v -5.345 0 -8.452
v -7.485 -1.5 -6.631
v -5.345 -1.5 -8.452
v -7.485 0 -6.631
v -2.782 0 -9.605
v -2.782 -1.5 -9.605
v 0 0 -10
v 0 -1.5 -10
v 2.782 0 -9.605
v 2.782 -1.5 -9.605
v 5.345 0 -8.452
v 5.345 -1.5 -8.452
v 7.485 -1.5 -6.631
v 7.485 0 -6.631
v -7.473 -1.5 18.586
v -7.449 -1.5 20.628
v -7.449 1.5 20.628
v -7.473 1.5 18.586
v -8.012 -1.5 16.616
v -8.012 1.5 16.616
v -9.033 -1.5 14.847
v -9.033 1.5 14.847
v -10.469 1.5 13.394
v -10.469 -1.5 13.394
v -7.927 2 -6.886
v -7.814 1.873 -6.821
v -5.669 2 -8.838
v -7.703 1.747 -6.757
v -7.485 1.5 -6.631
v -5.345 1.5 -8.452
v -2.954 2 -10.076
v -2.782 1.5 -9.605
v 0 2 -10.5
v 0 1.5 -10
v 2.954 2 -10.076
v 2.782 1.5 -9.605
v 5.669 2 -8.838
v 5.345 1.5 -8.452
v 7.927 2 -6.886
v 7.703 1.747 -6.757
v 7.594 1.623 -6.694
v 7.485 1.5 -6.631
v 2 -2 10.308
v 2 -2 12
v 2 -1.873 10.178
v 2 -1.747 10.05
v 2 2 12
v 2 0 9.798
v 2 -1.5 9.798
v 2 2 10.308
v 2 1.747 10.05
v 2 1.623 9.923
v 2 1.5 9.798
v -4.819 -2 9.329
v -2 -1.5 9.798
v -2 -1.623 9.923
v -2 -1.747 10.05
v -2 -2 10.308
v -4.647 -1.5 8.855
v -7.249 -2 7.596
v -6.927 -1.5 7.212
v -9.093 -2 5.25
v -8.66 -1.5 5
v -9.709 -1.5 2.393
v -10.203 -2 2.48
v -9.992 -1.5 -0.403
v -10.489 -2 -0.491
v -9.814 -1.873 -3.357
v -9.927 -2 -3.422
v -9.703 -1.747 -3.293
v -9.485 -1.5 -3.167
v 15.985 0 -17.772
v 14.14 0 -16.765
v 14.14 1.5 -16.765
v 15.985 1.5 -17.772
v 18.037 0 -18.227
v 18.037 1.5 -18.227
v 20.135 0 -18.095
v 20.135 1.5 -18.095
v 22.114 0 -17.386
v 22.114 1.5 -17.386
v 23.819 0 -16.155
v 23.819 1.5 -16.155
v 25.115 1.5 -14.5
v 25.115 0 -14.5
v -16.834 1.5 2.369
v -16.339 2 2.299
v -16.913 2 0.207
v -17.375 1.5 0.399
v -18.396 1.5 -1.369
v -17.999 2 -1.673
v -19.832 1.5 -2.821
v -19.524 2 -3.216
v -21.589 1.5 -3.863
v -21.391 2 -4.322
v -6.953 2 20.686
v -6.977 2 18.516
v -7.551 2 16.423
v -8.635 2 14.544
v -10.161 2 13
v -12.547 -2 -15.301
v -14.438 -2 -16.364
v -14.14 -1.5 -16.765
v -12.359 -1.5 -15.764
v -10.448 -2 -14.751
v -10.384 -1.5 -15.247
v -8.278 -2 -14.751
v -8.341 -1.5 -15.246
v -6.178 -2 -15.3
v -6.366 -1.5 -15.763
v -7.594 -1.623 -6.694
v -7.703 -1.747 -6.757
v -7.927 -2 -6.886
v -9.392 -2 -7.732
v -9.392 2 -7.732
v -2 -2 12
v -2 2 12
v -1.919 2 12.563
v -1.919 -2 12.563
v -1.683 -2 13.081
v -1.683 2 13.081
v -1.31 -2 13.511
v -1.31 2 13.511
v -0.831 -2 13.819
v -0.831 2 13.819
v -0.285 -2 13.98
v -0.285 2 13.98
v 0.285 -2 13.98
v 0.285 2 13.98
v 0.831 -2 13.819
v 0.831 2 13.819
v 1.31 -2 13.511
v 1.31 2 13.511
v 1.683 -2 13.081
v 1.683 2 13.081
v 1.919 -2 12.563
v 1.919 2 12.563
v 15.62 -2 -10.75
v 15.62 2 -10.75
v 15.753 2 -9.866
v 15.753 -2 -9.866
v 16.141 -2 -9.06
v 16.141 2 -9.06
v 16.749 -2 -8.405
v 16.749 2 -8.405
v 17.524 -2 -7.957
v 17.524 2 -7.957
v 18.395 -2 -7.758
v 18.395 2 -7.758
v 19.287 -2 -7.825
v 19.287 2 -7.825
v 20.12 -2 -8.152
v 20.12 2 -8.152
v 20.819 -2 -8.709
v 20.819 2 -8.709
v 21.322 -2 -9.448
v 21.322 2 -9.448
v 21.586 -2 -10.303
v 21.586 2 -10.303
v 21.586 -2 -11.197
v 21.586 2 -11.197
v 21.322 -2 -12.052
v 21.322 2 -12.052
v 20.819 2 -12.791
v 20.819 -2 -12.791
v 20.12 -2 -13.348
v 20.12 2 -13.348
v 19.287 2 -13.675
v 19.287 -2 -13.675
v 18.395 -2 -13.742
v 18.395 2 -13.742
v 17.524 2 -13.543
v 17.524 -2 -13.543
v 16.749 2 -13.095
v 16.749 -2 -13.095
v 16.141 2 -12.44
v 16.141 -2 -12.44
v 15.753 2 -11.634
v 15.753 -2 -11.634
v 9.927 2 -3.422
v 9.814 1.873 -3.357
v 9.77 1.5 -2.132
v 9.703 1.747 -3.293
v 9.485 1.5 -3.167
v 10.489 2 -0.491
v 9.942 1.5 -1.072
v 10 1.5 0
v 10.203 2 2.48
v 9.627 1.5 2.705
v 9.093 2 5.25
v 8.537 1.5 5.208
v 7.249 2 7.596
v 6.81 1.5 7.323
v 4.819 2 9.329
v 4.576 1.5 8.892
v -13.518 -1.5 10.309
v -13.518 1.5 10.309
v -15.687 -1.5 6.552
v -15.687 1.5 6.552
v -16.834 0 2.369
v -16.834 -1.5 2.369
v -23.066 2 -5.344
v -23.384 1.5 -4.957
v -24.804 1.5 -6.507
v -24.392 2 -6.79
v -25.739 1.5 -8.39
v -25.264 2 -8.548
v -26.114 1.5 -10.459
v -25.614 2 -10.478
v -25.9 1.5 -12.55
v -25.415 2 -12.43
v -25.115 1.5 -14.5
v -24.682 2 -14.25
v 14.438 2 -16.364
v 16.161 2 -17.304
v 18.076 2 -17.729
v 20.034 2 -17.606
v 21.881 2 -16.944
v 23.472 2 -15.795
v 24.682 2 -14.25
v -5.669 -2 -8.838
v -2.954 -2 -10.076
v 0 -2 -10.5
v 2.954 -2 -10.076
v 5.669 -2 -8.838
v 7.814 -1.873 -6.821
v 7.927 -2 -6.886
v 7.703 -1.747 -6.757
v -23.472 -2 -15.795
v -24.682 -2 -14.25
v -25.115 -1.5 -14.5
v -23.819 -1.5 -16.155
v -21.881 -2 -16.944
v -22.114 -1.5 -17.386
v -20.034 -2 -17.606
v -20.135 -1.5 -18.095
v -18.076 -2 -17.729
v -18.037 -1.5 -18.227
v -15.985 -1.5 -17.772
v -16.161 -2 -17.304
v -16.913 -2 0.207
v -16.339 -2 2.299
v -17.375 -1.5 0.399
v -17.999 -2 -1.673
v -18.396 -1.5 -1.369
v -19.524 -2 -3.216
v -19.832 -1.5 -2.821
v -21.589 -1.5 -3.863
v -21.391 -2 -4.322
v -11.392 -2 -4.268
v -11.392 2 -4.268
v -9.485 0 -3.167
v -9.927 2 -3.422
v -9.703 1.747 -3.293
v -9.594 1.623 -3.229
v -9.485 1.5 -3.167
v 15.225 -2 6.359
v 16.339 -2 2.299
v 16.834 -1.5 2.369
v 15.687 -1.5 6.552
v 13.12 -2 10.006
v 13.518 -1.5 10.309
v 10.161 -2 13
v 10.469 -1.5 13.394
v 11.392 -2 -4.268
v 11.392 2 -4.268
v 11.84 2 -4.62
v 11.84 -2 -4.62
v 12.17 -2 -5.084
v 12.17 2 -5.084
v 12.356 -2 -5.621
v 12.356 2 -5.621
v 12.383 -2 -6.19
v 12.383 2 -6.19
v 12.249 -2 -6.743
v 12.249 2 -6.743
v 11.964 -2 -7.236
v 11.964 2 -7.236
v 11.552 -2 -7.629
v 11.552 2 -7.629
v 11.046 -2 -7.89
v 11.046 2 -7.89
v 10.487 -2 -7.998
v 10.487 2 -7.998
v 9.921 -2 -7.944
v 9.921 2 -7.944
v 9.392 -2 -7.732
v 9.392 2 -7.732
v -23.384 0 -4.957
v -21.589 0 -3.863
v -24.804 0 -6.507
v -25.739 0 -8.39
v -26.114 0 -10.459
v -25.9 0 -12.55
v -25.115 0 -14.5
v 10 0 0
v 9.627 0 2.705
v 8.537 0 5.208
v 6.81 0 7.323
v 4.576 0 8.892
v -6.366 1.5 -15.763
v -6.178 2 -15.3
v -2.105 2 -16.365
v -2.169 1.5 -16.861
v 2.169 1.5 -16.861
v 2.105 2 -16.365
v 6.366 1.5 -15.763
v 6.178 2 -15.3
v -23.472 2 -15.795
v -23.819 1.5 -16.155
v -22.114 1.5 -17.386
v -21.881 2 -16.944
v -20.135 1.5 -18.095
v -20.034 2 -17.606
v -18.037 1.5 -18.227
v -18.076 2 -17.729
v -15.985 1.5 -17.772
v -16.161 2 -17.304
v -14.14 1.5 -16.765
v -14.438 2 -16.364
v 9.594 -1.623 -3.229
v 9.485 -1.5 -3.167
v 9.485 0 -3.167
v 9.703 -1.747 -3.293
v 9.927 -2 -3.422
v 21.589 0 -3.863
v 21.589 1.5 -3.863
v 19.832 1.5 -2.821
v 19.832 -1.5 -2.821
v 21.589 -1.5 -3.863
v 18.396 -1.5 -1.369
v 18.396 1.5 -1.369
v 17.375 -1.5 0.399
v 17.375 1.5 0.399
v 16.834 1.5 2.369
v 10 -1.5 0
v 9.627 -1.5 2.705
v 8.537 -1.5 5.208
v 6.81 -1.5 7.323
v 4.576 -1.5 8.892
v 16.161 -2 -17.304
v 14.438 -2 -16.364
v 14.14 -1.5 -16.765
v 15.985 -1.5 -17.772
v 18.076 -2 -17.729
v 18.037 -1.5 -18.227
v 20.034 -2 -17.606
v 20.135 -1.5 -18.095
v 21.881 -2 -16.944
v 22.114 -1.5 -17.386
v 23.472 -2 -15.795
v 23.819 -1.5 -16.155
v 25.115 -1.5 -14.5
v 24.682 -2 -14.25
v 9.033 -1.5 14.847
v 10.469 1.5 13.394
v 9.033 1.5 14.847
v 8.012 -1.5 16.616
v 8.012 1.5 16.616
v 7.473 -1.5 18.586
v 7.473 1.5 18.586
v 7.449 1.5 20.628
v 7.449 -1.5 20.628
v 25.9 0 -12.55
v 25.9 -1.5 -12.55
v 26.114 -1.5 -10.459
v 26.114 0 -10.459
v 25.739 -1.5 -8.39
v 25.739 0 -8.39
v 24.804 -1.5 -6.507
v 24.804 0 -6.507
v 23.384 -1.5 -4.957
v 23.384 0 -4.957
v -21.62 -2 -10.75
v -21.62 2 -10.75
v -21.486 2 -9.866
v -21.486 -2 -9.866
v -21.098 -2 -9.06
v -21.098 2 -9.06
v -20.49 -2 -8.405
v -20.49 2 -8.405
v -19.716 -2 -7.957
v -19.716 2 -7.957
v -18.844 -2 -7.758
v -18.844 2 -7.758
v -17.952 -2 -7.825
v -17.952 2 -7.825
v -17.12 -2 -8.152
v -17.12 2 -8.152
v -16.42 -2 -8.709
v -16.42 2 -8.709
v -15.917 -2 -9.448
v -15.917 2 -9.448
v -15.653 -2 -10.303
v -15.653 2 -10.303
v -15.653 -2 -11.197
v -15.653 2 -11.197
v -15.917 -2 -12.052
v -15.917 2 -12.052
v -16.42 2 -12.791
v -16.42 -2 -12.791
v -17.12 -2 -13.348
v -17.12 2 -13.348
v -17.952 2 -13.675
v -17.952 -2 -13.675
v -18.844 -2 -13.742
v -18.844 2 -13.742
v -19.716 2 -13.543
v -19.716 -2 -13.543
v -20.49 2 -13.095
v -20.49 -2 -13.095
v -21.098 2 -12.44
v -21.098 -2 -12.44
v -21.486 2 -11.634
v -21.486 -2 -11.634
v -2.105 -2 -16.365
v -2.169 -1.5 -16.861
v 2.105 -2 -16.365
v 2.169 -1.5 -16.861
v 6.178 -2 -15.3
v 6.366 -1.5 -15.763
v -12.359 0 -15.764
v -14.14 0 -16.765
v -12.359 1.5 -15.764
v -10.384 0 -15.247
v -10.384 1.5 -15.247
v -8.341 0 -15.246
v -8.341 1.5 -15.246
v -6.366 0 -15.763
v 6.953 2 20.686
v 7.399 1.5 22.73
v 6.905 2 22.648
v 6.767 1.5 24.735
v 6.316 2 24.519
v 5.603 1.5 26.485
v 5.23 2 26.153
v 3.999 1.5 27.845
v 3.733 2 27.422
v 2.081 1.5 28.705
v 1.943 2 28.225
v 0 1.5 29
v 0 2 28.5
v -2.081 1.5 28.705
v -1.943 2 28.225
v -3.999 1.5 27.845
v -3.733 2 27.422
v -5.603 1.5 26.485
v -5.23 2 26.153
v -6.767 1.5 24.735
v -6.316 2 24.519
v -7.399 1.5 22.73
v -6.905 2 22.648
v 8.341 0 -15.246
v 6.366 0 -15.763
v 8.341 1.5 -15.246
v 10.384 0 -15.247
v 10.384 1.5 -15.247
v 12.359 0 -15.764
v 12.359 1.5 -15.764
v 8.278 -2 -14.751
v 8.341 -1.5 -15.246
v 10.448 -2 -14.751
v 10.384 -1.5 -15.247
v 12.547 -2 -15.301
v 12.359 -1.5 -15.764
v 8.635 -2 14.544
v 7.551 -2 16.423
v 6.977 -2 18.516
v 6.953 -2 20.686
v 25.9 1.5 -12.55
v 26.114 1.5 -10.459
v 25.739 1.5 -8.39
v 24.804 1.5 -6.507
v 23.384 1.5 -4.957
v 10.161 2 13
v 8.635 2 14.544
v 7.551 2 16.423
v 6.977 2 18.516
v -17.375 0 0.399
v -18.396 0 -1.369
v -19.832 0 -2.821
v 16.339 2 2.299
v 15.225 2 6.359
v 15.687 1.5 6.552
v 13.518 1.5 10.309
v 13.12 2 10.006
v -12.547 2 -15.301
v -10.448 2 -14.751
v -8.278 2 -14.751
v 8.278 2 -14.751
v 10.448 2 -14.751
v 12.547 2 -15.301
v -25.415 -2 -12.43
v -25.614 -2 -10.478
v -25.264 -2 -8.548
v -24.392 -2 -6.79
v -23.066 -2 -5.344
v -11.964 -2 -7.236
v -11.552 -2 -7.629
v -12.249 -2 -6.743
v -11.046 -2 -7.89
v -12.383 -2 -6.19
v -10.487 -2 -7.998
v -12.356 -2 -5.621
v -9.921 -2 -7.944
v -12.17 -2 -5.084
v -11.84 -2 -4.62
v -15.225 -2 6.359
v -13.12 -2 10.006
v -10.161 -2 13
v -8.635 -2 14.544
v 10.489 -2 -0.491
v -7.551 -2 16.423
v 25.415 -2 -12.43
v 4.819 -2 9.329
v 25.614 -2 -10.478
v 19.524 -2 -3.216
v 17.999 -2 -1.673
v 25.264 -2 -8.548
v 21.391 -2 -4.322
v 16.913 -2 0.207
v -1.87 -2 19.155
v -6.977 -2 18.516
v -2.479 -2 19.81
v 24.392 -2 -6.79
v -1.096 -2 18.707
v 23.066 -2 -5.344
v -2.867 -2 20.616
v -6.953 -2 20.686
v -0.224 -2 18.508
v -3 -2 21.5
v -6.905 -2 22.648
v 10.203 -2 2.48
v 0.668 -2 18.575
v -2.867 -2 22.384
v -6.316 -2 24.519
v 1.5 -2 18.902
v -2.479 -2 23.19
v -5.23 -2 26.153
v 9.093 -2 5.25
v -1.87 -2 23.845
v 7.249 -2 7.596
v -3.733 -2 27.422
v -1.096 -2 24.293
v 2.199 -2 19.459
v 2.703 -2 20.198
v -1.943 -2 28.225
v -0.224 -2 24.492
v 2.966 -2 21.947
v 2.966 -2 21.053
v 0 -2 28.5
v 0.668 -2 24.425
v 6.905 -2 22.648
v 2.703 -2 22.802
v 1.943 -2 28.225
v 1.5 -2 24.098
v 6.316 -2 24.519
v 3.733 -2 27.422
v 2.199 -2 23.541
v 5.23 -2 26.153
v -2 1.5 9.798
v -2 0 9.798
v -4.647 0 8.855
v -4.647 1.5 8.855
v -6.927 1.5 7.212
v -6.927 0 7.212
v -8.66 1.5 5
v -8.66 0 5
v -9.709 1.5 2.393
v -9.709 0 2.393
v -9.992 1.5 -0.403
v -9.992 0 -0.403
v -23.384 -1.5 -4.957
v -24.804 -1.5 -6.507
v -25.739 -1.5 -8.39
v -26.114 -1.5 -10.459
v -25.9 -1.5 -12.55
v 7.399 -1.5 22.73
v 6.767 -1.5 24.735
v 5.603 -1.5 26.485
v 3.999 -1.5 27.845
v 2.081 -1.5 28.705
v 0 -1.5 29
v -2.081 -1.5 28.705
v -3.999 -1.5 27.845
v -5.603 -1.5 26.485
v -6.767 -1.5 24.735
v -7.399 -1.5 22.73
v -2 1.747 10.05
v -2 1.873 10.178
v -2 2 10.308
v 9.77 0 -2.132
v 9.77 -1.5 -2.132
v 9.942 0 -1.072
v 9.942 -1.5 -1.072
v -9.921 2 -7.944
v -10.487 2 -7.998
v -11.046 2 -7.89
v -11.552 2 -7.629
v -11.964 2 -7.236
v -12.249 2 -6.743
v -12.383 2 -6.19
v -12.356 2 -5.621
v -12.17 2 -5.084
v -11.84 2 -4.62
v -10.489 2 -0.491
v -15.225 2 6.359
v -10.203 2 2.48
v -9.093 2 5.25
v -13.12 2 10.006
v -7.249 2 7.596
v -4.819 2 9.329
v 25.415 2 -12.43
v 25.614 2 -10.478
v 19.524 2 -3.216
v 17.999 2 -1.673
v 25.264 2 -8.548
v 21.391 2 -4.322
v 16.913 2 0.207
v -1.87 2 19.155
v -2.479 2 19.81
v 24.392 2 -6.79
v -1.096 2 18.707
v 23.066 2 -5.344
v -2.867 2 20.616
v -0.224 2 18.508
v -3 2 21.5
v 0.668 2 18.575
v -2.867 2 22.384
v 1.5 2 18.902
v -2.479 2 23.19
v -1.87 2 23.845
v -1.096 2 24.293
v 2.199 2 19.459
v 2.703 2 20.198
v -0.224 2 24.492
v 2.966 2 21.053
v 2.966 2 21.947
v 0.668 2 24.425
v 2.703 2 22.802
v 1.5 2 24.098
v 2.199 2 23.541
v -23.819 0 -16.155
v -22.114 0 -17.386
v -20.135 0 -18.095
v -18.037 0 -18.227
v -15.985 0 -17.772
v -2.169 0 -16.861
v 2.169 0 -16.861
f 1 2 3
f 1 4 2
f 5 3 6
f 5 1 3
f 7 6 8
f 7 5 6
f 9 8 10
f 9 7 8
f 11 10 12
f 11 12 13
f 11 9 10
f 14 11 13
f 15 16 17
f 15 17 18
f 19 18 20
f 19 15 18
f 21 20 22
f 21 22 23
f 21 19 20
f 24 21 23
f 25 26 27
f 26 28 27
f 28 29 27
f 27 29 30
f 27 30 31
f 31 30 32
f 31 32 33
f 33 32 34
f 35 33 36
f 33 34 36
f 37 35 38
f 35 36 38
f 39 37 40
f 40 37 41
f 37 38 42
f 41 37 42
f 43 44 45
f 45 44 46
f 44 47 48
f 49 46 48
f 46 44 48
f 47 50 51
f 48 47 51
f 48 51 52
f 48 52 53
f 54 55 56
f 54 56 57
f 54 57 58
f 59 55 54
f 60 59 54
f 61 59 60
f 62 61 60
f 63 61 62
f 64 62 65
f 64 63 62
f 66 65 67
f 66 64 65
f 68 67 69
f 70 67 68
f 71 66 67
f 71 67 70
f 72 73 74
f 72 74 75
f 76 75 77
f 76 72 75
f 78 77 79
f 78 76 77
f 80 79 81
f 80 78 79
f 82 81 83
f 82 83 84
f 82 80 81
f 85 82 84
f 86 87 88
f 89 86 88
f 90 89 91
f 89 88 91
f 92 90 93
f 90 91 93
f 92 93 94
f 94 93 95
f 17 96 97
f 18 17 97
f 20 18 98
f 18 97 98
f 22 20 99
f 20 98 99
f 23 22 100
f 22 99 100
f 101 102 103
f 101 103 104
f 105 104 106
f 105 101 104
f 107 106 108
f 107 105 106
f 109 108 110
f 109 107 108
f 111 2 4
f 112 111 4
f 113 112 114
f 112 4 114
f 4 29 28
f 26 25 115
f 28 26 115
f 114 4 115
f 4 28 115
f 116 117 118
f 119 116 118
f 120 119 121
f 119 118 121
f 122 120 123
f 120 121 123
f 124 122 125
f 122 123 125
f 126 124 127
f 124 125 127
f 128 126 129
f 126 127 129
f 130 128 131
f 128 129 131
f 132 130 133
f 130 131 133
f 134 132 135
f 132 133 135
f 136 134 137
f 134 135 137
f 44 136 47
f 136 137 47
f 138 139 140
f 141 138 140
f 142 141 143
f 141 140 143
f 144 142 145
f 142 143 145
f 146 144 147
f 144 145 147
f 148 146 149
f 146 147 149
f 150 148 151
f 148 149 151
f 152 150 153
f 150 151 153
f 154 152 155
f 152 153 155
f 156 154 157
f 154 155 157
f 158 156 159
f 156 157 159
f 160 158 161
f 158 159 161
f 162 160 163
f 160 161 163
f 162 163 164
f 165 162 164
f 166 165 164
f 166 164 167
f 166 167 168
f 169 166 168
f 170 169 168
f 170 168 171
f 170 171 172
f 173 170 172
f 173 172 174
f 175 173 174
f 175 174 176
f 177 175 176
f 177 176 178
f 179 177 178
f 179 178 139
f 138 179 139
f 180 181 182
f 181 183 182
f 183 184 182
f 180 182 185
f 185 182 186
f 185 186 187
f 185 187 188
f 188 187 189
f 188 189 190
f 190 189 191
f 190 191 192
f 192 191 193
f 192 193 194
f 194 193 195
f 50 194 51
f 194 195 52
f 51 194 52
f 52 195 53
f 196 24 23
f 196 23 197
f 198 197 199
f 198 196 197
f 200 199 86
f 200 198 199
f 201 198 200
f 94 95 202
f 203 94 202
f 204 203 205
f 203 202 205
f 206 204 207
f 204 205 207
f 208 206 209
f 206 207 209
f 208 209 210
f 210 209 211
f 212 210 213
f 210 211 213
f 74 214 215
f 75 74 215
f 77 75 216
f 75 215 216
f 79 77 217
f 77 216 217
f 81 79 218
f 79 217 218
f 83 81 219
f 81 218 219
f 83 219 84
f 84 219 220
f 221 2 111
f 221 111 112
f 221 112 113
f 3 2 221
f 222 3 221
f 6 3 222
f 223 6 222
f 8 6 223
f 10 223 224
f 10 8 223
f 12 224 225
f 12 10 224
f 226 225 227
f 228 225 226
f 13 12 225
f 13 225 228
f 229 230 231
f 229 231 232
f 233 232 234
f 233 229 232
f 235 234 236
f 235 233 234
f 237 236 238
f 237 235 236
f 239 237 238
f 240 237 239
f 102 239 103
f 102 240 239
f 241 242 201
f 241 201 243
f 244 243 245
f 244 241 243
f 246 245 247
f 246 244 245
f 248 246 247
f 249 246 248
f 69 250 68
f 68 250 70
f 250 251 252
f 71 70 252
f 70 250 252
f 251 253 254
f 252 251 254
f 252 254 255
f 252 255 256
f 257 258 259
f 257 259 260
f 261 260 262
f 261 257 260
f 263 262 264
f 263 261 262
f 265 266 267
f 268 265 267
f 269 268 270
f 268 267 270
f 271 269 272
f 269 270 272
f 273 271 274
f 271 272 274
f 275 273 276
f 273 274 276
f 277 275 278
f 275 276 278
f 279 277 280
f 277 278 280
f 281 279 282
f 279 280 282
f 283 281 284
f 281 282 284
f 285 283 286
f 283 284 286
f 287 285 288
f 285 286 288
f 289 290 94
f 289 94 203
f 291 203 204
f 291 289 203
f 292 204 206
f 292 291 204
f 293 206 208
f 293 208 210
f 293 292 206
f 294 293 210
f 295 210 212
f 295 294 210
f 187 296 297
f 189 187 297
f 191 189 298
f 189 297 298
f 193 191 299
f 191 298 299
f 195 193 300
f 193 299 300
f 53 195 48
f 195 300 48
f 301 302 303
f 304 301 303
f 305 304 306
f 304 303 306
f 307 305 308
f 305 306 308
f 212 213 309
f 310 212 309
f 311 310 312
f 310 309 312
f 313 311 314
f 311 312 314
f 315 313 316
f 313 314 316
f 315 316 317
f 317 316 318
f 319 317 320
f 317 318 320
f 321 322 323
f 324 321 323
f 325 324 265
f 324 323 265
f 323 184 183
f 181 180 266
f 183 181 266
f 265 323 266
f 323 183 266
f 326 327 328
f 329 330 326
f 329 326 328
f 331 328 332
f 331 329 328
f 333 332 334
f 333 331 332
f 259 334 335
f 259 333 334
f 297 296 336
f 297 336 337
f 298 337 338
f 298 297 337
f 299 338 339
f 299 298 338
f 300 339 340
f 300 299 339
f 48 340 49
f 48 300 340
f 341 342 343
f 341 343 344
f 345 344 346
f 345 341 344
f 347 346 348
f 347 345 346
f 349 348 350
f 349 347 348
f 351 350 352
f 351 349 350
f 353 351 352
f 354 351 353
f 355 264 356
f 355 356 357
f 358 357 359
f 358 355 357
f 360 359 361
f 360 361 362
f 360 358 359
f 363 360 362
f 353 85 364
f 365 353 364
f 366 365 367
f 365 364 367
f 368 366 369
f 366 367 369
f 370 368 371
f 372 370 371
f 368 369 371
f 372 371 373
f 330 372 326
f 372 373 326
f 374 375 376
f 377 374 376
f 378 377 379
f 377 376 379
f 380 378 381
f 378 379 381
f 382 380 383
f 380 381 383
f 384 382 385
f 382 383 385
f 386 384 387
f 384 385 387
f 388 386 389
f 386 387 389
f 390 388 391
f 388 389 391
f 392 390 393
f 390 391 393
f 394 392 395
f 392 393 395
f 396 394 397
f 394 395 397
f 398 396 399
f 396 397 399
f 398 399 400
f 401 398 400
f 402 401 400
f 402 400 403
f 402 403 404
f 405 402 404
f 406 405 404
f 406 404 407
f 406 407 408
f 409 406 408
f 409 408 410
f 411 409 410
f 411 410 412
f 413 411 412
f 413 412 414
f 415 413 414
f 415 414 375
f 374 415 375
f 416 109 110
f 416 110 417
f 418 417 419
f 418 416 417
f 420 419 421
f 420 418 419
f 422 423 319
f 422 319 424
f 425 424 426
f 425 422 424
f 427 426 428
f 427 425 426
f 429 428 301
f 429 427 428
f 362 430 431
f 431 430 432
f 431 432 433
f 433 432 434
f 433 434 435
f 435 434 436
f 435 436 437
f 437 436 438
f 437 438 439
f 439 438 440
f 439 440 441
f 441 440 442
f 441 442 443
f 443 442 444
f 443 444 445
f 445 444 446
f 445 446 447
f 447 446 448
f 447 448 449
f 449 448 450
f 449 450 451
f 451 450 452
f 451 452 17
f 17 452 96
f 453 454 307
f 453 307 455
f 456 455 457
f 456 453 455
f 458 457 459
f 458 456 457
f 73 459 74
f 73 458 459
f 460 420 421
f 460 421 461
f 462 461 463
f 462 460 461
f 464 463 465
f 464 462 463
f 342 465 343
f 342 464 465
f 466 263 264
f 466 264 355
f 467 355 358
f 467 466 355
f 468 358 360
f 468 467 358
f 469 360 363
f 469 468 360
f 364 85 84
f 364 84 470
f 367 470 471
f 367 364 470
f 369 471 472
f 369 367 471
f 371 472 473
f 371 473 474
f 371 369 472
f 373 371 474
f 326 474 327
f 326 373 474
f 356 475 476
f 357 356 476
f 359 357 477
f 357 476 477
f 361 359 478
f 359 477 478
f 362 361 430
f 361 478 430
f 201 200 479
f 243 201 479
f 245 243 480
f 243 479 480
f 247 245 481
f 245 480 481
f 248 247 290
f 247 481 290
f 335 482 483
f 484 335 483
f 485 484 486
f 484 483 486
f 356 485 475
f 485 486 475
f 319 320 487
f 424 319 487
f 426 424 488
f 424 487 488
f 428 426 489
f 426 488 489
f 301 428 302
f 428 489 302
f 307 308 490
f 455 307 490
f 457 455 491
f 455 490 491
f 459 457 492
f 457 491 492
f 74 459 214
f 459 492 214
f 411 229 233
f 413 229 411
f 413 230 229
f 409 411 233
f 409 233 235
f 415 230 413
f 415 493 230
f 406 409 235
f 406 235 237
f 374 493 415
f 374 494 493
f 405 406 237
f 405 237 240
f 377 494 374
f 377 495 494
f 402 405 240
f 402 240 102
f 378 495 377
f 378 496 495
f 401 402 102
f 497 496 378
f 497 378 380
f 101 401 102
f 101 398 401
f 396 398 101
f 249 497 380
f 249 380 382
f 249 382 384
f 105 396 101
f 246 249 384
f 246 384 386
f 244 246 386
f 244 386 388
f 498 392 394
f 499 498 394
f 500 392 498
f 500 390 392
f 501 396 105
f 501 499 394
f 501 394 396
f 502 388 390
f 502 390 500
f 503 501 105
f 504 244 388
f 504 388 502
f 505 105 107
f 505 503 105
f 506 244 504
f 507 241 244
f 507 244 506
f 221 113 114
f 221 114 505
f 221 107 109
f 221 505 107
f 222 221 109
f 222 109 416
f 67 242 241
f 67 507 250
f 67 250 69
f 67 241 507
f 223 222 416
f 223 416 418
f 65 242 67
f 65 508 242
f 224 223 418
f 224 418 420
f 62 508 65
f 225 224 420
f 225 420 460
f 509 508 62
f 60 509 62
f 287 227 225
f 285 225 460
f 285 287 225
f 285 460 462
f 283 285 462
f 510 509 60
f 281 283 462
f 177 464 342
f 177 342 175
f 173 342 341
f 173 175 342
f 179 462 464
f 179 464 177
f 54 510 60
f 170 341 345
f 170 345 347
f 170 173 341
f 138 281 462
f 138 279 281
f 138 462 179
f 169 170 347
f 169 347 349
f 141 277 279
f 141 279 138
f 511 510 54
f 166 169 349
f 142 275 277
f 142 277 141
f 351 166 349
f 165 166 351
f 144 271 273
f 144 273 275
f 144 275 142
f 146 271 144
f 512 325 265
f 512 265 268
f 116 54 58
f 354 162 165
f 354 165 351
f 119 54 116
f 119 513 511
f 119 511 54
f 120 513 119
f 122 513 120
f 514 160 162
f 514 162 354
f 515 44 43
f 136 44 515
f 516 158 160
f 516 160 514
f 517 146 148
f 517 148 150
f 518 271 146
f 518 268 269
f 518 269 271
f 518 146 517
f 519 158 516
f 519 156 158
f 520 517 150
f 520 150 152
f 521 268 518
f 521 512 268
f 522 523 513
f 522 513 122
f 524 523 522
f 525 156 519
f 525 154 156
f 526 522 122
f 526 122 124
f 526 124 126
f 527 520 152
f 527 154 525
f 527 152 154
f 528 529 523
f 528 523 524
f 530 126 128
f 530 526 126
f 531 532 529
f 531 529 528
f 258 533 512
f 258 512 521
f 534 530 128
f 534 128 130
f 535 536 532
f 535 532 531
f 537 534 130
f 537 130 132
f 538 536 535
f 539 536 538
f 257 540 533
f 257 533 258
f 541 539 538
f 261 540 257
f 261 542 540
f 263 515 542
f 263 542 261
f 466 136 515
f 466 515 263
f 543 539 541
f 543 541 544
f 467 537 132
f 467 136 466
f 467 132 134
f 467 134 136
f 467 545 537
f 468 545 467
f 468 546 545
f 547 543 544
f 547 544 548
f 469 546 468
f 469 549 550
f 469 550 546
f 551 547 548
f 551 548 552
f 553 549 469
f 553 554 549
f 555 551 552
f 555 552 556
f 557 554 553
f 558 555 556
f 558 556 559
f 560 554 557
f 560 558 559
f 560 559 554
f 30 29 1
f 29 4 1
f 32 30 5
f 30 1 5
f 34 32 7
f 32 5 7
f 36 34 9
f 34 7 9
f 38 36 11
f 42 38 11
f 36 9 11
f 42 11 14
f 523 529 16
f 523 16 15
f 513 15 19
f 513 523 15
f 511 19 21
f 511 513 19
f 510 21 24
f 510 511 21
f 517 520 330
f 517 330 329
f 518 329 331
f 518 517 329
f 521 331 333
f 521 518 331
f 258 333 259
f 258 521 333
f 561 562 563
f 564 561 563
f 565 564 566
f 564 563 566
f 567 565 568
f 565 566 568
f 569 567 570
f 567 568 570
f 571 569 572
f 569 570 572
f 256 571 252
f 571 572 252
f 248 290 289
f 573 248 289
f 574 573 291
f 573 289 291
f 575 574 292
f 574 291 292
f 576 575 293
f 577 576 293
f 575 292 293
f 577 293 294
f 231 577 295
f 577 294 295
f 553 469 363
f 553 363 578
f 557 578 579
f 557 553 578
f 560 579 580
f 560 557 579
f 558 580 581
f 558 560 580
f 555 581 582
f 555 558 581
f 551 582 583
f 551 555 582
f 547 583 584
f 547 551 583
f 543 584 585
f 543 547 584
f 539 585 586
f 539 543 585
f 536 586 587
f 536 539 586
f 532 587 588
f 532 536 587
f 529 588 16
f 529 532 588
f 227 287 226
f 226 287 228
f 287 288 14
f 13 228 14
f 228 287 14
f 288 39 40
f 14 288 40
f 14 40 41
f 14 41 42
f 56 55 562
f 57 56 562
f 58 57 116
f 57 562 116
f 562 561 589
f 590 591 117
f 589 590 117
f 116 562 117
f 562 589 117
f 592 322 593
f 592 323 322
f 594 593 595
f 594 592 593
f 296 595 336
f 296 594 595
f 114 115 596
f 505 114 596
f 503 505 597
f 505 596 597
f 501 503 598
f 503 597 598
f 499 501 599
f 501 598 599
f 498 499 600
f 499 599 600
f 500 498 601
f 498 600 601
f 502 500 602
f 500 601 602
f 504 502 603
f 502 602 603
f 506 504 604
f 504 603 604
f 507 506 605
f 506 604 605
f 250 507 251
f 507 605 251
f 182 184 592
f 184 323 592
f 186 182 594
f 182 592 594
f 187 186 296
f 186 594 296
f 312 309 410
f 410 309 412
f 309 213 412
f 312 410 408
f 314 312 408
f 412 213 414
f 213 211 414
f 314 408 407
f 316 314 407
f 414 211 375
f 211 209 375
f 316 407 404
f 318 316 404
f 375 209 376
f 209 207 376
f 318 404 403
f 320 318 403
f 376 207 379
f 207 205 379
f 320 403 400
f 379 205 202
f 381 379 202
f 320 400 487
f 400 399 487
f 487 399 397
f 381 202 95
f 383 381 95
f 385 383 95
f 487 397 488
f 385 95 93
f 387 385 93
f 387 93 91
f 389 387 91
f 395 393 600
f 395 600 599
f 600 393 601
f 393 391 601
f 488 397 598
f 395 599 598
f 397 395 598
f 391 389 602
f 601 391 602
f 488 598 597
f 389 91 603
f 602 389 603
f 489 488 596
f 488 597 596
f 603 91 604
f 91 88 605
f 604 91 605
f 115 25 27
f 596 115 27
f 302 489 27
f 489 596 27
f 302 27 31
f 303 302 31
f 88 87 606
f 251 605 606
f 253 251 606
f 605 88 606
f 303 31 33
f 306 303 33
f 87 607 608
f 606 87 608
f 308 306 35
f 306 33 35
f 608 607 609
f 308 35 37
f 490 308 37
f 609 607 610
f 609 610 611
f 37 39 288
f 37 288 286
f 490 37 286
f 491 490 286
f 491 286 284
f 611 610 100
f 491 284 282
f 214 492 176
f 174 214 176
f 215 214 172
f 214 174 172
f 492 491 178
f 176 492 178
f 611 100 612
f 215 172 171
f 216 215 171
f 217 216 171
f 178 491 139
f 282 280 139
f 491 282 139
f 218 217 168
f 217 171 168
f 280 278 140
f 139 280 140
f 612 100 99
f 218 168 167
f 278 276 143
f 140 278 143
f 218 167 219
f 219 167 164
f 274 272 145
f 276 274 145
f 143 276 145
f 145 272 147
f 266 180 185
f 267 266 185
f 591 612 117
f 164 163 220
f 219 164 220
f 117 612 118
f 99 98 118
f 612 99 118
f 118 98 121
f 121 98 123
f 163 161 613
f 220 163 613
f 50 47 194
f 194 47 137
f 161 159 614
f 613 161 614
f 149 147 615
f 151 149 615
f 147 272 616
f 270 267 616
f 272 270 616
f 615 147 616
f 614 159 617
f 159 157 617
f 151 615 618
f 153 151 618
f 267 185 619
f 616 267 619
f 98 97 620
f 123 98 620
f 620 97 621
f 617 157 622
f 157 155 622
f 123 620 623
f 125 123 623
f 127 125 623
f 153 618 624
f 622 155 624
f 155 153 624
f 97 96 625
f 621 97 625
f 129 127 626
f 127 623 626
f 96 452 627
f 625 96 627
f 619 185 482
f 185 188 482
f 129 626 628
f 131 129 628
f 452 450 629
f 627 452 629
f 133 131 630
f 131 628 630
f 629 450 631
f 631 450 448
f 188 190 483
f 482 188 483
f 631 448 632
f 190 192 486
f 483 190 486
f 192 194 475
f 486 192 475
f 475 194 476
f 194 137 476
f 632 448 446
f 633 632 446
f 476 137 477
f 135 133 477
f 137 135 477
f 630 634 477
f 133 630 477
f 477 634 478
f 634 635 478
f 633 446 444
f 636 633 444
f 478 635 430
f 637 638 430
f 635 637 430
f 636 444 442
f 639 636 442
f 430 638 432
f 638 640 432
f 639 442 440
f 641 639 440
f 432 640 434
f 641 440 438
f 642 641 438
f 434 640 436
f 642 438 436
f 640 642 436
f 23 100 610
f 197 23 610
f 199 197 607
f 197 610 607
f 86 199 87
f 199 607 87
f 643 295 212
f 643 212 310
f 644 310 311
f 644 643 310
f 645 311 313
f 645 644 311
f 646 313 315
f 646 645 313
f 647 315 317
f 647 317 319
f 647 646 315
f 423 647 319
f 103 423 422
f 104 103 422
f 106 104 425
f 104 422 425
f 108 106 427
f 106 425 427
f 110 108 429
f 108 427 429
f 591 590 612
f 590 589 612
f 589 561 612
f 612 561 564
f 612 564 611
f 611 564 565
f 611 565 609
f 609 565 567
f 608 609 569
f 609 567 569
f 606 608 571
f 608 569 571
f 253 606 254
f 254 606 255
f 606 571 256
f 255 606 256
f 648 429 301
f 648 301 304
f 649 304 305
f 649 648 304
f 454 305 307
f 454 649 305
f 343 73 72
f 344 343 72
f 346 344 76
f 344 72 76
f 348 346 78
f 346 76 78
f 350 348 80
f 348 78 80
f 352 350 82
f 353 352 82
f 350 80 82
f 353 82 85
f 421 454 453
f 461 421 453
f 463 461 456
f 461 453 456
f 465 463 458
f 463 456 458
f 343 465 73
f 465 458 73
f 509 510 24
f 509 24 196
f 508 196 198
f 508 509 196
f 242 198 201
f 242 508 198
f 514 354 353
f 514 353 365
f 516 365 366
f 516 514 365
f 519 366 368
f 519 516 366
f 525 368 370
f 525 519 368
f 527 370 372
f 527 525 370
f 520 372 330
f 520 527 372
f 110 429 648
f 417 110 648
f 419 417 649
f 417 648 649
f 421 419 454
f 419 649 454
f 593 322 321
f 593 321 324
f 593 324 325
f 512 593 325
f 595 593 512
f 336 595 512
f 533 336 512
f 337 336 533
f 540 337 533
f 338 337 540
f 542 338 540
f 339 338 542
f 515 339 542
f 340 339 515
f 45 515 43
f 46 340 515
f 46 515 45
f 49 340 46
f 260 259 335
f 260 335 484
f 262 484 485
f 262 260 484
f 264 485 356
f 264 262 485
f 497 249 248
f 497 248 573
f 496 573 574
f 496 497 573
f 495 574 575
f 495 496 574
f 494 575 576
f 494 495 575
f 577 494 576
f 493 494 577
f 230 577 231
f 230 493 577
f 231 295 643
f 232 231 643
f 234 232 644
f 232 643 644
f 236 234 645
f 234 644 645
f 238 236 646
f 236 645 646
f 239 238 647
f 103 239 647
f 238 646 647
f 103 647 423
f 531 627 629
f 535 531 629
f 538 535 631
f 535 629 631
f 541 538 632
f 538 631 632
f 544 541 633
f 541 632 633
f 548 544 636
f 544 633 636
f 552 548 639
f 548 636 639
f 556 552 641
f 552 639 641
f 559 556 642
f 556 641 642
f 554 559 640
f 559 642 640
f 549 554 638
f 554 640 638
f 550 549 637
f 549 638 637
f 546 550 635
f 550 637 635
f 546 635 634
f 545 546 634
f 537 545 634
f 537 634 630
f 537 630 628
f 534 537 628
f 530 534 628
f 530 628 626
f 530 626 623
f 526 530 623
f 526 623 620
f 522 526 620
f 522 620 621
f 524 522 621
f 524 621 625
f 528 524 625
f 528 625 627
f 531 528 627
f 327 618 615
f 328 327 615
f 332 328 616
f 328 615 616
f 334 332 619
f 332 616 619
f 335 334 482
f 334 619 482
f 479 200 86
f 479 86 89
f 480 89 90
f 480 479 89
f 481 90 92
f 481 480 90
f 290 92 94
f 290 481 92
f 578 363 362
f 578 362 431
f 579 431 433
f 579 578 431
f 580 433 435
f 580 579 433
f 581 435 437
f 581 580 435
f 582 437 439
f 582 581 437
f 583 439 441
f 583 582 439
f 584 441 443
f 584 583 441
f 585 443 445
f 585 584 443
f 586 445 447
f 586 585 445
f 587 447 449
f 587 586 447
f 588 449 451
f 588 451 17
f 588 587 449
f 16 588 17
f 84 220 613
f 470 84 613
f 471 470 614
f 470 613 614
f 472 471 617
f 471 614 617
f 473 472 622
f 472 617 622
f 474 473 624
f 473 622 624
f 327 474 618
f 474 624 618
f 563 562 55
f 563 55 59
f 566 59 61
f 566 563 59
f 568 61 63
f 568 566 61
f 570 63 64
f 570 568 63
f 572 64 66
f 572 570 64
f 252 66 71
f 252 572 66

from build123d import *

# Parameters (mm, degrees)
F0_R          = 10
F1_DEPTH      = 2
F1_DEPTH_BACK = 2
F3_D          = 6
F4_SIZE       = 0.5
F7_DEPTH      = 4.001


# Not quite as in the source:
# - two fillets or chamfers of one size are made in one step


with BuildPart() as f1:
    # F0 (on Front) → F1 (new body, two sides)
    with BuildSketch(Plane.XZ) as f1_sk:
        with BuildLine():
            ThreePointArc((10.4685027699, 13.3944186047), (8.0122088596, 16.6160342353), (7.4491243619, 20.6279069767))
            ThreePointArc((7.4491243619, 20.6279069767), (5.6031552573, 26.4854439284), (0, 29))
            ThreePointArc((0, 29), (-5.6031552573, 26.4854439284), (-7.4491243619, 20.6279069767))
            ThreePointArc((-7.4491243619, 20.6279069767), (-8.0122088596, 16.6160342353), (-10.4685027699, 13.3944186047))
            ThreePointArc((-10.4685027699, 13.3944186047), (-14.7224318643, 8.5), (-16.8341581655, 2.368780036))
            ThreePointArc((-16.8341581655, 2.368780036), (-18.3960121877, -1.3692407048), (-21.5888536497, -3.862822555))
            ThreePointArc((-21.5888536497, -3.862822555), (-25.7386449011, -8.39024717), (-25.1147367097, -14.5))
            ThreePointArc((-25.1147367097, -14.5), (-20.1354896438, -18.0951967583), (-14.1397292878, -16.7650844217))
            ThreePointArc((-14.1397292878, -16.7650844217), (-10.3838033281, -15.2467935304), (-6.3656553956, -15.7631986406))
            ThreePointArc((-6.3656553956, -15.7631986406), (0, -17), (6.3656553956, -15.7631986406))
            ThreePointArc((6.3656553956, -15.7631986406), (10.3838033281, -15.2467935304), (14.1397292878, -16.7650844217))
            ThreePointArc((14.1397292878, -16.7650844217), (20.1354896438, -18.0951967583), (25.1147367097, -14.5))
            ThreePointArc((25.1147367097, -14.5), (25.7386449011, -8.39024717), (21.5888536497, -3.862822555))
            ThreePointArc((21.5888536497, -3.862822555), (18.3960121877, -1.3692407048), (16.8341581655, 2.368780036))
            ThreePointArc((16.8341581655, 2.368780036), (14.7224318643, 8.5), (10.4685027699, 13.3944186047))
        make_face()
        Circle(F0_R, mode=Mode.SUBTRACT)
    extrude(amount=F1_DEPTH)
    extrude(f1_sk.sketch, amount=-F1_DEPTH_BACK)

    # F3 (through all)
    with Locations(Plane.XZ.offset(2)):
        with Locations((0, 21.5), (-18.6195461814, -10.75), (18.6195461814, -10.75)):
            Hole(F3_D / 2)

    # F4
    f4_edges = [f1.edges().sort_by_distance(p)[0] for p in [
        (-10, -2, 0),
        (10, 0, 0),
        (-10, 2, 0),
        (8.012209, -2, 16.616034),
        (8.012209, 2, 16.616034),
        (14.722432, -2, 8.5),
        (14.722432, 2, 8.5),
        (0, -2, 29),
        (18.396012, -2, -1.369241),
        (-8.012209, -2, 16.616034),
        (25.114737, -2, -14.5),
        (-14.722432, -2, 8.5),
        (10.383803, -2, -15.246794),
        (-18.396012, -2, -1.369241),
        (0, -2, -17),
        (-25.114737, -2, -14.5),
        (-10.383803, -2, -15.246794),
        (0, 2, 29),
        (18.396012, 2, -1.369241),
        (-8.012209, 2, 16.616034),
        (25.114737, 2, -14.5),
        (-14.722432, 2, 8.5),
        (10.383803, 2, -15.246794),
        (-18.396012, 2, -1.369241),
        (0, 2, -17),
        (-25.114737, 2, -14.5),
        (-10.383803, 2, -15.246794),
    ]]
    chamfer(f4_edges, length=F4_SIZE)

    # F6 (on face) → F7 (cut, through all)
    with BuildSketch(Plane(origin=(0, 2, 0), x_dir=(-1, 0, 0), z_dir=(0, 1, 0))):
        with BuildLine():
            ThreePointArc((-2, 9.7979589711), (0, 10), (2, 9.7979589711))
            Line((2, 9.7979589711), (2, 12))
            ThreePointArc((2, 12), (0, 14), (-2, 12))
            Line((-2, 12), (-2, 9.7979589711))
        make_face()
        with BuildLine():
            Line((-9.3923048454, -7.7320508076), (-7.4852813742, -6.6310302931))
            ThreePointArc((-7.4852813742, -6.6310302931), (-8.6602540378, -5), (-9.4852813742, -3.166928678))
            Line((-9.4852813742, -3.166928678), (-11.3923048454, -4.2679491924))
            ThreePointArc((-11.3923048454, -4.2679491924), (-12.124355653, -7), (-9.3923048454, -7.7320508076))
        make_face()
        with BuildLine():
            Line((11.3923048454, -4.2679491924), (9.4852813742, -3.166928678))
            ThreePointArc((9.4852813742, -3.166928678), (8.6602540378, -5), (7.4852813742, -6.6310302931))
            Line((7.4852813742, -6.6310302931), (9.3923048454, -7.7320508076))
            ThreePointArc((9.3923048454, -7.7320508076), (12.124355653, -7), (11.3923048454, -4.2679491924))
        make_face()
    extrude(amount=-F7_DEPTH, mode=Mode.SUBTRACT)


solid = f1.part
